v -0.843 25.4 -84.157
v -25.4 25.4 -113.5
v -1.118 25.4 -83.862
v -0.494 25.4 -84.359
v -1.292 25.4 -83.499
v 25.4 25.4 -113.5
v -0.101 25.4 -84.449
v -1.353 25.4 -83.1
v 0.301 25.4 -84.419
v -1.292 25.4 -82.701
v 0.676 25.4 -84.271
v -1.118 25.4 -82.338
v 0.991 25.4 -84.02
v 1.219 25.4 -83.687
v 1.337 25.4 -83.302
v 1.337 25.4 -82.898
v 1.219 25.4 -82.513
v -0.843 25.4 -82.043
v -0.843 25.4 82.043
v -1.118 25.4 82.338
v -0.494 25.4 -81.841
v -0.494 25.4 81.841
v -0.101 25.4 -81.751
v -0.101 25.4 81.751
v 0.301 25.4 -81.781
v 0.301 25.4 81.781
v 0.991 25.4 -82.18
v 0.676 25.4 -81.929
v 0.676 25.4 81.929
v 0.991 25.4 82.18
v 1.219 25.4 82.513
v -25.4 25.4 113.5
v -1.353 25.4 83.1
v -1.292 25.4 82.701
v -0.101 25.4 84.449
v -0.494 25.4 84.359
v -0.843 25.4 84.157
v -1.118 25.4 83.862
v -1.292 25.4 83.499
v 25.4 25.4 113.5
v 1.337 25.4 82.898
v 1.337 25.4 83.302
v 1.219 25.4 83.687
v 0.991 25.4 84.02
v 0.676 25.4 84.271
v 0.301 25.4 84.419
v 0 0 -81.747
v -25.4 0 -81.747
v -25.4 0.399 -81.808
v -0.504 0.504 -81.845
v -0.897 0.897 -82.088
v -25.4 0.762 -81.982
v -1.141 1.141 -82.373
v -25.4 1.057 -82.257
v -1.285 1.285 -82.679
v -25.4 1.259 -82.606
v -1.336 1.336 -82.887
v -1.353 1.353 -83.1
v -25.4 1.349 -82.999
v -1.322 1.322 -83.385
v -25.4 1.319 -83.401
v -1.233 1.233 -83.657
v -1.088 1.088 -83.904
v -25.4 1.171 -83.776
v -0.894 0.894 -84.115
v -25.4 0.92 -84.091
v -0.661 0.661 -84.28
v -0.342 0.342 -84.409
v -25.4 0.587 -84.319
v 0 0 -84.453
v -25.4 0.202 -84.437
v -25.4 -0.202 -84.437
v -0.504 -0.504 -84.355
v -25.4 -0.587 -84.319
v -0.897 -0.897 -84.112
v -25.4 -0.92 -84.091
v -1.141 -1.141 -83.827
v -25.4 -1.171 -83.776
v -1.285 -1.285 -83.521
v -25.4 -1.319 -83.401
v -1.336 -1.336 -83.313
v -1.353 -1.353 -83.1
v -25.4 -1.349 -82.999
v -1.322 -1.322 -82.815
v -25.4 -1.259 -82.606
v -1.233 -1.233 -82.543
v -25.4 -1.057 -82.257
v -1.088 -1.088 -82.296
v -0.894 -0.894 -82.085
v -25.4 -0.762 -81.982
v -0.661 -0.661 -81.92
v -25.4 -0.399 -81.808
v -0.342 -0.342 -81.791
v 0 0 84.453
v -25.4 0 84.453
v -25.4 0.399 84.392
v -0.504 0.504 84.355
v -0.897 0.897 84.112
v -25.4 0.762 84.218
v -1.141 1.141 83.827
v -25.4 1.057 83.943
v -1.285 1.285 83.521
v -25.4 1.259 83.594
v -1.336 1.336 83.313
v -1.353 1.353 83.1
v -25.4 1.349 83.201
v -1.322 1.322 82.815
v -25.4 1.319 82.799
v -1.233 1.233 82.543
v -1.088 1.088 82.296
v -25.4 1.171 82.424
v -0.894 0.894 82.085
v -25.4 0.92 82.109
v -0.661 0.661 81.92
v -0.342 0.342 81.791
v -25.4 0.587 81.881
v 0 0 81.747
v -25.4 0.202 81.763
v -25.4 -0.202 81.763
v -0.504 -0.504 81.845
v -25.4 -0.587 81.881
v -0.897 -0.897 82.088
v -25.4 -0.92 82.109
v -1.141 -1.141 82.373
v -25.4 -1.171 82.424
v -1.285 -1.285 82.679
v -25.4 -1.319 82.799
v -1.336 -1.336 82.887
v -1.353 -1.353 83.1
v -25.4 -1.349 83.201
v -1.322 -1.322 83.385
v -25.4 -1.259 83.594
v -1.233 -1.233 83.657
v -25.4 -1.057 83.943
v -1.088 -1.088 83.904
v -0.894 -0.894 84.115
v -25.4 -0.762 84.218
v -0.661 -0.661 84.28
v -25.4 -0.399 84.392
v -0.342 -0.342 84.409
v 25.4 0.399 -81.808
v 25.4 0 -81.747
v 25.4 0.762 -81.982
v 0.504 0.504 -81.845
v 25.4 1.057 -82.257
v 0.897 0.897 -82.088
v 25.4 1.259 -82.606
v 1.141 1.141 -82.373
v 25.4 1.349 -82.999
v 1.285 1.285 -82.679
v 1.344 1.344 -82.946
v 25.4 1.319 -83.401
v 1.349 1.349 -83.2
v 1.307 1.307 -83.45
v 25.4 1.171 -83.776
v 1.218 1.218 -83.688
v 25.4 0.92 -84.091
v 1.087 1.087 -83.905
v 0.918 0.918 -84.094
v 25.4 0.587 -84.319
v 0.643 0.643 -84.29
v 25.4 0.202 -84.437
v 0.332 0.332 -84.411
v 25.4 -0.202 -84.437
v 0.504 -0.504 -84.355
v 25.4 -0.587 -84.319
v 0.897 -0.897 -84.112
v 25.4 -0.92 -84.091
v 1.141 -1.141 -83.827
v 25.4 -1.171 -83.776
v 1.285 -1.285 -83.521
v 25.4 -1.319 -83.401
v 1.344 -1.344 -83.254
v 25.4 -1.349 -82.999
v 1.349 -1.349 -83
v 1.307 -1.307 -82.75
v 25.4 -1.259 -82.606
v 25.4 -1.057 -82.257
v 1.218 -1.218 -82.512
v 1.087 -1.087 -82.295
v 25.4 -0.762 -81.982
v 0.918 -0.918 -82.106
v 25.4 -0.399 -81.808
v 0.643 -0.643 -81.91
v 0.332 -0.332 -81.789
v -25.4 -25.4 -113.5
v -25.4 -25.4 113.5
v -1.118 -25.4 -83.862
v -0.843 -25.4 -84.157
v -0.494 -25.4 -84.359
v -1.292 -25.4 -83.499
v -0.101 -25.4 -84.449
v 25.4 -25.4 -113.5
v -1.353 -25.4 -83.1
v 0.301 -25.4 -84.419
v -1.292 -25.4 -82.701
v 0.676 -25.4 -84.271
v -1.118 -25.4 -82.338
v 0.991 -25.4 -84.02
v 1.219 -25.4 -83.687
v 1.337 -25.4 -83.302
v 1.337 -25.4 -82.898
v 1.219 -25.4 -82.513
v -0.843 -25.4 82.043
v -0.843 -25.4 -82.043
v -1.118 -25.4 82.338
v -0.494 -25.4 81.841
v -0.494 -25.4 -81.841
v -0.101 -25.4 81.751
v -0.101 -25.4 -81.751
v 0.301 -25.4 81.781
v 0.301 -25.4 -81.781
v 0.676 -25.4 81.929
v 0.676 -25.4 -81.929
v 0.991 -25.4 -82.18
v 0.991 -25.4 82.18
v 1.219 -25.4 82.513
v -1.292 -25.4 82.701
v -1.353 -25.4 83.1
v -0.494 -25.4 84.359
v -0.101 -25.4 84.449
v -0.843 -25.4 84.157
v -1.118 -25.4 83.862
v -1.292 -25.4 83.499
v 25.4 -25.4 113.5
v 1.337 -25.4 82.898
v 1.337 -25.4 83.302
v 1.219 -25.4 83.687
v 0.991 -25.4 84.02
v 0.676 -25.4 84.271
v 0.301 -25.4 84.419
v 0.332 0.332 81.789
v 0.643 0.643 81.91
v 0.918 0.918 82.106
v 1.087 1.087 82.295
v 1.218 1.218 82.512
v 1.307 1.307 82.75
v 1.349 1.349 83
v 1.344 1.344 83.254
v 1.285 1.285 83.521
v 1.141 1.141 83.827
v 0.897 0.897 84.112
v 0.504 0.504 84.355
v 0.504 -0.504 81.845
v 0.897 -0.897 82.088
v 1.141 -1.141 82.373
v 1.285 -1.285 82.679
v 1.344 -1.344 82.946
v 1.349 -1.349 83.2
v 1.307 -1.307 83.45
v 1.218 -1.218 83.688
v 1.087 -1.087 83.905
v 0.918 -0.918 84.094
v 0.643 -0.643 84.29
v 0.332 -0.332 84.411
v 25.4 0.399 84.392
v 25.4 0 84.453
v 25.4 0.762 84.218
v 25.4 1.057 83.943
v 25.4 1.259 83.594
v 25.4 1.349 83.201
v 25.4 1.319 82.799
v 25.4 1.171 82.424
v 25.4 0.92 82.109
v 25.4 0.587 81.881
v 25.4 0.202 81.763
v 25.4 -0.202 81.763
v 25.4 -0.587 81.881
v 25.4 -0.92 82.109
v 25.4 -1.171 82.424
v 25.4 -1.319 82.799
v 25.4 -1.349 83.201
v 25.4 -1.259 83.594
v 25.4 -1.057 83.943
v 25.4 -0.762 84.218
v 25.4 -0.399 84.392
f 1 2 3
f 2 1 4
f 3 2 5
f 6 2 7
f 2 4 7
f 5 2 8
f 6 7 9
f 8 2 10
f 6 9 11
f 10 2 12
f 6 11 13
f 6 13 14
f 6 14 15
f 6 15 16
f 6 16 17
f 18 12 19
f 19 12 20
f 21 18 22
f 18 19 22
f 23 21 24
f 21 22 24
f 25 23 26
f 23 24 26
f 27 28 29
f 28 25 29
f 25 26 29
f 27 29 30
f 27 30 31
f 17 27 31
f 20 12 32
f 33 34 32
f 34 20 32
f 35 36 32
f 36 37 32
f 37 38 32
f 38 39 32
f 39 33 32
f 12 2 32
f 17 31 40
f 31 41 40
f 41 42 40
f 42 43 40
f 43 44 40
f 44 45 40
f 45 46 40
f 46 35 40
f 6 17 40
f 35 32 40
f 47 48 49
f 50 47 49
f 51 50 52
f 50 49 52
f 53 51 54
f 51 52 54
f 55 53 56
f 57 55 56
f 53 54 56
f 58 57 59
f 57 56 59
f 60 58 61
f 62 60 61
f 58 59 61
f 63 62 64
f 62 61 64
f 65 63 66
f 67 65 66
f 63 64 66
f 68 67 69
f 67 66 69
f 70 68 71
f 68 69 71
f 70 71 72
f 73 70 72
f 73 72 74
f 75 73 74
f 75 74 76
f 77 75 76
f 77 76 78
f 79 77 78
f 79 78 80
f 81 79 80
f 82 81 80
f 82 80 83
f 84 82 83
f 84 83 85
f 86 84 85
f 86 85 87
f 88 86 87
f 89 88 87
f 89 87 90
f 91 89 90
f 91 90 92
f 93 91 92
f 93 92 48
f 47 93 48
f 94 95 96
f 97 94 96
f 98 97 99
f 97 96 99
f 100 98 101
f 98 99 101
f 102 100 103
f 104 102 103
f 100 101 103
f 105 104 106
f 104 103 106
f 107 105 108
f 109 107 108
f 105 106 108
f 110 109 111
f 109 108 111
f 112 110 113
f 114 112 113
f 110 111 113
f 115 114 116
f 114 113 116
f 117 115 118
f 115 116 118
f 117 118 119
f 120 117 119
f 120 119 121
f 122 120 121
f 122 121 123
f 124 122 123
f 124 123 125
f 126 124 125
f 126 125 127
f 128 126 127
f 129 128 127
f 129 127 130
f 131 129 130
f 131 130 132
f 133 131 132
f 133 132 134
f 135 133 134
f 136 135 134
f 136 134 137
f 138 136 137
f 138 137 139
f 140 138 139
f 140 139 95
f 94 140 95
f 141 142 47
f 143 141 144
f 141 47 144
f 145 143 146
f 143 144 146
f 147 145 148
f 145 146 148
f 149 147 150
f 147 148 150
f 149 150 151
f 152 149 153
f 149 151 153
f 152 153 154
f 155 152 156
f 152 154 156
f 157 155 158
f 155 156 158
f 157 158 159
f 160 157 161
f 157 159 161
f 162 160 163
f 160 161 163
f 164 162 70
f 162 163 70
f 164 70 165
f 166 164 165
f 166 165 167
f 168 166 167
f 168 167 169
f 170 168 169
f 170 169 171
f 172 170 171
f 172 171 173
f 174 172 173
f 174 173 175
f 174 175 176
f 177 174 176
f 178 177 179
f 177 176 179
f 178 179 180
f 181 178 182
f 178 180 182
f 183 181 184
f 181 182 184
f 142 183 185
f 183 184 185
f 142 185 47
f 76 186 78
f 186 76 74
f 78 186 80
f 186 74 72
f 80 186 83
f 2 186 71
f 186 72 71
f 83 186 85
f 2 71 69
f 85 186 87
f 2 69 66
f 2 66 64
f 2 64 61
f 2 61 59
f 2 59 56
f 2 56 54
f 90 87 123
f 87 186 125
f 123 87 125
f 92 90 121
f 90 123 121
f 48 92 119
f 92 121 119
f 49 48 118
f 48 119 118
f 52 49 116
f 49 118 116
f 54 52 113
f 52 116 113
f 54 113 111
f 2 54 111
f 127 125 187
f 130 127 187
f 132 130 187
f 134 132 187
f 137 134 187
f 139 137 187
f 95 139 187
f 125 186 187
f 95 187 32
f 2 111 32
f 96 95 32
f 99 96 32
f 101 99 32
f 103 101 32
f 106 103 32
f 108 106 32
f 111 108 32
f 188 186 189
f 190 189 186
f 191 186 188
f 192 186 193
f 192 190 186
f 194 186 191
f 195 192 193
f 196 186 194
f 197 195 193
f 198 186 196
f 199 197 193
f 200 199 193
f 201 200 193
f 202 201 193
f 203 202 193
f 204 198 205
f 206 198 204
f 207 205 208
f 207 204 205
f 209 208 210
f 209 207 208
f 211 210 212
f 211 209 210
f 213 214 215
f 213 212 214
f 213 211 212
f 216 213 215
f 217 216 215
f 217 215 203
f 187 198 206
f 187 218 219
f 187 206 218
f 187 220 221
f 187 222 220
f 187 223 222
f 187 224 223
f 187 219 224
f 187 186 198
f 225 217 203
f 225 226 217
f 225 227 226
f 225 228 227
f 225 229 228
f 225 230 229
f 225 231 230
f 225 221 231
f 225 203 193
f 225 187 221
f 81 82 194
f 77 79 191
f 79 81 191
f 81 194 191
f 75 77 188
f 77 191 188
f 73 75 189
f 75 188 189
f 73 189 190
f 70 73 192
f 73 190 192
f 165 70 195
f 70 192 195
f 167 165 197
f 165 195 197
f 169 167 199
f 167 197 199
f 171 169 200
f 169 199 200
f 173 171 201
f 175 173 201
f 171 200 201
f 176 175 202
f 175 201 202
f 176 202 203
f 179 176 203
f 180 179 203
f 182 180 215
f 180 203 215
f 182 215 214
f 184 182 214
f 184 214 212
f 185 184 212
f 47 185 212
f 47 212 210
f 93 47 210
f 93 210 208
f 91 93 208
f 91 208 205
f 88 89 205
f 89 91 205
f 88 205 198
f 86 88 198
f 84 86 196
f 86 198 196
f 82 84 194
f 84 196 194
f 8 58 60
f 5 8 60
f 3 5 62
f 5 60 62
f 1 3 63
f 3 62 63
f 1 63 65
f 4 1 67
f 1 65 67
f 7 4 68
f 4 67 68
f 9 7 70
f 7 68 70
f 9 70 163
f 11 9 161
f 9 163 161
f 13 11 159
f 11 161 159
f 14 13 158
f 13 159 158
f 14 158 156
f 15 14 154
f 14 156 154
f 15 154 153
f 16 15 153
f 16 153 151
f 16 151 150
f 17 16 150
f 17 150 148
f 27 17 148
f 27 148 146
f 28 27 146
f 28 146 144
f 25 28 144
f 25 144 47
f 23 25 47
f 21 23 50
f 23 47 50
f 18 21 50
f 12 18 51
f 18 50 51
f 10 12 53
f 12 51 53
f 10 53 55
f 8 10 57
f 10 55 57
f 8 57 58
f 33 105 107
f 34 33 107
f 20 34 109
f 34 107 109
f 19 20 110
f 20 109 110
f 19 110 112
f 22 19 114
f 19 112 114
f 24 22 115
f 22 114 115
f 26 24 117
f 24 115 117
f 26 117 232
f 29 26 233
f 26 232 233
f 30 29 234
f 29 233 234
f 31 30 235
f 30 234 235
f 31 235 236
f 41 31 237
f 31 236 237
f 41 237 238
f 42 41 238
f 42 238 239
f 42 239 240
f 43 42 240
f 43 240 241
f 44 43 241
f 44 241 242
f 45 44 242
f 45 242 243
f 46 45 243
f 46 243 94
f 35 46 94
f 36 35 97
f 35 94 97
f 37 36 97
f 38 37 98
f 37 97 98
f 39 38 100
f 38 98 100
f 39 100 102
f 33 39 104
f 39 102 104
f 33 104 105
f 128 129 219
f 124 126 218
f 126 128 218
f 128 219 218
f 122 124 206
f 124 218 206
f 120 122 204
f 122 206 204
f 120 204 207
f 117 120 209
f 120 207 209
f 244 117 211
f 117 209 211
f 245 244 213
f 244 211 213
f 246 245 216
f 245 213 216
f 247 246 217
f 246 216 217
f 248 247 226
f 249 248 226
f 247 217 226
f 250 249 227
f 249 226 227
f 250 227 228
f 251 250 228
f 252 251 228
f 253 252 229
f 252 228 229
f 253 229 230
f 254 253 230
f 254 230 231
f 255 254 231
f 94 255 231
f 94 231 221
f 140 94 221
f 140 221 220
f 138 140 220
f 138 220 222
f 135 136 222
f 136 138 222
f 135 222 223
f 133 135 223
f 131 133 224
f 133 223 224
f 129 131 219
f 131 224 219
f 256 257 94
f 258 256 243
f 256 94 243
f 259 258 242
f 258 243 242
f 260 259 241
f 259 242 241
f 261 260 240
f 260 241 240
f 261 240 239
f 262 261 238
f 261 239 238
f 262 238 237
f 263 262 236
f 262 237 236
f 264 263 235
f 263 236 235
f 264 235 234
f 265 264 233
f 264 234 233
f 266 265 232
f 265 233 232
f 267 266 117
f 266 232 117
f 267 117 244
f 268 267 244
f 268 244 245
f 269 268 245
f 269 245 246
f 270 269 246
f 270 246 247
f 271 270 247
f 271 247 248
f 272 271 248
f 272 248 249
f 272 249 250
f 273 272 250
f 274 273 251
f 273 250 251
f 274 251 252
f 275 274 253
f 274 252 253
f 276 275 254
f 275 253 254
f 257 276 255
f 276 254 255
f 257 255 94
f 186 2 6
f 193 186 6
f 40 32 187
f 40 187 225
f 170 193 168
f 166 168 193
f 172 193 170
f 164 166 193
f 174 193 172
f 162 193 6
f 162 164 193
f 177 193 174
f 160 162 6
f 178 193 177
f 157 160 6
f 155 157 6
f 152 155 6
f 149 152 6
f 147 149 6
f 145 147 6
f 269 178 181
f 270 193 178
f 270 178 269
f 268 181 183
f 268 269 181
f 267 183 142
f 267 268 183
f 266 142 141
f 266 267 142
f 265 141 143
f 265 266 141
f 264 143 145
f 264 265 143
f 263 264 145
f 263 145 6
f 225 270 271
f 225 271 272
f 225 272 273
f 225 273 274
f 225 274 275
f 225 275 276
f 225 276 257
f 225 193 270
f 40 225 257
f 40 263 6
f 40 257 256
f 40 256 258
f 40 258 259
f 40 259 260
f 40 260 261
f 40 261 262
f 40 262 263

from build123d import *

# Parameters (mm, degrees)
ESQUISSE1_W                              = 50.8
ESQUISSE1_H                              = 50.8
BOSS_EXTRU_1_DEPTH                       = 113.5
TROU_POUR_TARAUDAGE_POUR_TROU_TARAUD_6_D = 2.7051
TROU_POUR_TARAUDAGE_POUR_TROU_TARAUD_2_D = 2.7051


with BuildPart() as part:
    # Esquisse1 → Boss.-Extru.1 (new, symmetric)
    with BuildSketch(Plane.XY):
        Rectangle(ESQUISSE1_W, ESQUISSE1_H)
    extrude(amount=BOSS_EXTRU_1_DEPTH, both=True)

    # Trou pour taraudage pour trou taraud_ _6 (through all)
    with Locations(Plane(origin=(25.4, 0, 0), x_dir=(0, 0, -1), z_dir=(1, 0, 0))):
        with Locations((-83.1, 0), (83.1, 0)):
            Hole(TROU_POUR_TARAUDAGE_POUR_TROU_TARAUD_6_D / 2)

    # Trou pour taraudage pour trou taraud 2 (through all)
    with Locations(Plane(origin=(0, 25.4, 0), x_dir=(1, 0, 0), z_dir=(0, 1, 0))):
        with Locations((0, -83.1), (0, 83.1)):
            Hole(TROU_POUR_TARAUDAGE_POUR_TROU_TARAUD_2_D / 2)


solid = part.part
